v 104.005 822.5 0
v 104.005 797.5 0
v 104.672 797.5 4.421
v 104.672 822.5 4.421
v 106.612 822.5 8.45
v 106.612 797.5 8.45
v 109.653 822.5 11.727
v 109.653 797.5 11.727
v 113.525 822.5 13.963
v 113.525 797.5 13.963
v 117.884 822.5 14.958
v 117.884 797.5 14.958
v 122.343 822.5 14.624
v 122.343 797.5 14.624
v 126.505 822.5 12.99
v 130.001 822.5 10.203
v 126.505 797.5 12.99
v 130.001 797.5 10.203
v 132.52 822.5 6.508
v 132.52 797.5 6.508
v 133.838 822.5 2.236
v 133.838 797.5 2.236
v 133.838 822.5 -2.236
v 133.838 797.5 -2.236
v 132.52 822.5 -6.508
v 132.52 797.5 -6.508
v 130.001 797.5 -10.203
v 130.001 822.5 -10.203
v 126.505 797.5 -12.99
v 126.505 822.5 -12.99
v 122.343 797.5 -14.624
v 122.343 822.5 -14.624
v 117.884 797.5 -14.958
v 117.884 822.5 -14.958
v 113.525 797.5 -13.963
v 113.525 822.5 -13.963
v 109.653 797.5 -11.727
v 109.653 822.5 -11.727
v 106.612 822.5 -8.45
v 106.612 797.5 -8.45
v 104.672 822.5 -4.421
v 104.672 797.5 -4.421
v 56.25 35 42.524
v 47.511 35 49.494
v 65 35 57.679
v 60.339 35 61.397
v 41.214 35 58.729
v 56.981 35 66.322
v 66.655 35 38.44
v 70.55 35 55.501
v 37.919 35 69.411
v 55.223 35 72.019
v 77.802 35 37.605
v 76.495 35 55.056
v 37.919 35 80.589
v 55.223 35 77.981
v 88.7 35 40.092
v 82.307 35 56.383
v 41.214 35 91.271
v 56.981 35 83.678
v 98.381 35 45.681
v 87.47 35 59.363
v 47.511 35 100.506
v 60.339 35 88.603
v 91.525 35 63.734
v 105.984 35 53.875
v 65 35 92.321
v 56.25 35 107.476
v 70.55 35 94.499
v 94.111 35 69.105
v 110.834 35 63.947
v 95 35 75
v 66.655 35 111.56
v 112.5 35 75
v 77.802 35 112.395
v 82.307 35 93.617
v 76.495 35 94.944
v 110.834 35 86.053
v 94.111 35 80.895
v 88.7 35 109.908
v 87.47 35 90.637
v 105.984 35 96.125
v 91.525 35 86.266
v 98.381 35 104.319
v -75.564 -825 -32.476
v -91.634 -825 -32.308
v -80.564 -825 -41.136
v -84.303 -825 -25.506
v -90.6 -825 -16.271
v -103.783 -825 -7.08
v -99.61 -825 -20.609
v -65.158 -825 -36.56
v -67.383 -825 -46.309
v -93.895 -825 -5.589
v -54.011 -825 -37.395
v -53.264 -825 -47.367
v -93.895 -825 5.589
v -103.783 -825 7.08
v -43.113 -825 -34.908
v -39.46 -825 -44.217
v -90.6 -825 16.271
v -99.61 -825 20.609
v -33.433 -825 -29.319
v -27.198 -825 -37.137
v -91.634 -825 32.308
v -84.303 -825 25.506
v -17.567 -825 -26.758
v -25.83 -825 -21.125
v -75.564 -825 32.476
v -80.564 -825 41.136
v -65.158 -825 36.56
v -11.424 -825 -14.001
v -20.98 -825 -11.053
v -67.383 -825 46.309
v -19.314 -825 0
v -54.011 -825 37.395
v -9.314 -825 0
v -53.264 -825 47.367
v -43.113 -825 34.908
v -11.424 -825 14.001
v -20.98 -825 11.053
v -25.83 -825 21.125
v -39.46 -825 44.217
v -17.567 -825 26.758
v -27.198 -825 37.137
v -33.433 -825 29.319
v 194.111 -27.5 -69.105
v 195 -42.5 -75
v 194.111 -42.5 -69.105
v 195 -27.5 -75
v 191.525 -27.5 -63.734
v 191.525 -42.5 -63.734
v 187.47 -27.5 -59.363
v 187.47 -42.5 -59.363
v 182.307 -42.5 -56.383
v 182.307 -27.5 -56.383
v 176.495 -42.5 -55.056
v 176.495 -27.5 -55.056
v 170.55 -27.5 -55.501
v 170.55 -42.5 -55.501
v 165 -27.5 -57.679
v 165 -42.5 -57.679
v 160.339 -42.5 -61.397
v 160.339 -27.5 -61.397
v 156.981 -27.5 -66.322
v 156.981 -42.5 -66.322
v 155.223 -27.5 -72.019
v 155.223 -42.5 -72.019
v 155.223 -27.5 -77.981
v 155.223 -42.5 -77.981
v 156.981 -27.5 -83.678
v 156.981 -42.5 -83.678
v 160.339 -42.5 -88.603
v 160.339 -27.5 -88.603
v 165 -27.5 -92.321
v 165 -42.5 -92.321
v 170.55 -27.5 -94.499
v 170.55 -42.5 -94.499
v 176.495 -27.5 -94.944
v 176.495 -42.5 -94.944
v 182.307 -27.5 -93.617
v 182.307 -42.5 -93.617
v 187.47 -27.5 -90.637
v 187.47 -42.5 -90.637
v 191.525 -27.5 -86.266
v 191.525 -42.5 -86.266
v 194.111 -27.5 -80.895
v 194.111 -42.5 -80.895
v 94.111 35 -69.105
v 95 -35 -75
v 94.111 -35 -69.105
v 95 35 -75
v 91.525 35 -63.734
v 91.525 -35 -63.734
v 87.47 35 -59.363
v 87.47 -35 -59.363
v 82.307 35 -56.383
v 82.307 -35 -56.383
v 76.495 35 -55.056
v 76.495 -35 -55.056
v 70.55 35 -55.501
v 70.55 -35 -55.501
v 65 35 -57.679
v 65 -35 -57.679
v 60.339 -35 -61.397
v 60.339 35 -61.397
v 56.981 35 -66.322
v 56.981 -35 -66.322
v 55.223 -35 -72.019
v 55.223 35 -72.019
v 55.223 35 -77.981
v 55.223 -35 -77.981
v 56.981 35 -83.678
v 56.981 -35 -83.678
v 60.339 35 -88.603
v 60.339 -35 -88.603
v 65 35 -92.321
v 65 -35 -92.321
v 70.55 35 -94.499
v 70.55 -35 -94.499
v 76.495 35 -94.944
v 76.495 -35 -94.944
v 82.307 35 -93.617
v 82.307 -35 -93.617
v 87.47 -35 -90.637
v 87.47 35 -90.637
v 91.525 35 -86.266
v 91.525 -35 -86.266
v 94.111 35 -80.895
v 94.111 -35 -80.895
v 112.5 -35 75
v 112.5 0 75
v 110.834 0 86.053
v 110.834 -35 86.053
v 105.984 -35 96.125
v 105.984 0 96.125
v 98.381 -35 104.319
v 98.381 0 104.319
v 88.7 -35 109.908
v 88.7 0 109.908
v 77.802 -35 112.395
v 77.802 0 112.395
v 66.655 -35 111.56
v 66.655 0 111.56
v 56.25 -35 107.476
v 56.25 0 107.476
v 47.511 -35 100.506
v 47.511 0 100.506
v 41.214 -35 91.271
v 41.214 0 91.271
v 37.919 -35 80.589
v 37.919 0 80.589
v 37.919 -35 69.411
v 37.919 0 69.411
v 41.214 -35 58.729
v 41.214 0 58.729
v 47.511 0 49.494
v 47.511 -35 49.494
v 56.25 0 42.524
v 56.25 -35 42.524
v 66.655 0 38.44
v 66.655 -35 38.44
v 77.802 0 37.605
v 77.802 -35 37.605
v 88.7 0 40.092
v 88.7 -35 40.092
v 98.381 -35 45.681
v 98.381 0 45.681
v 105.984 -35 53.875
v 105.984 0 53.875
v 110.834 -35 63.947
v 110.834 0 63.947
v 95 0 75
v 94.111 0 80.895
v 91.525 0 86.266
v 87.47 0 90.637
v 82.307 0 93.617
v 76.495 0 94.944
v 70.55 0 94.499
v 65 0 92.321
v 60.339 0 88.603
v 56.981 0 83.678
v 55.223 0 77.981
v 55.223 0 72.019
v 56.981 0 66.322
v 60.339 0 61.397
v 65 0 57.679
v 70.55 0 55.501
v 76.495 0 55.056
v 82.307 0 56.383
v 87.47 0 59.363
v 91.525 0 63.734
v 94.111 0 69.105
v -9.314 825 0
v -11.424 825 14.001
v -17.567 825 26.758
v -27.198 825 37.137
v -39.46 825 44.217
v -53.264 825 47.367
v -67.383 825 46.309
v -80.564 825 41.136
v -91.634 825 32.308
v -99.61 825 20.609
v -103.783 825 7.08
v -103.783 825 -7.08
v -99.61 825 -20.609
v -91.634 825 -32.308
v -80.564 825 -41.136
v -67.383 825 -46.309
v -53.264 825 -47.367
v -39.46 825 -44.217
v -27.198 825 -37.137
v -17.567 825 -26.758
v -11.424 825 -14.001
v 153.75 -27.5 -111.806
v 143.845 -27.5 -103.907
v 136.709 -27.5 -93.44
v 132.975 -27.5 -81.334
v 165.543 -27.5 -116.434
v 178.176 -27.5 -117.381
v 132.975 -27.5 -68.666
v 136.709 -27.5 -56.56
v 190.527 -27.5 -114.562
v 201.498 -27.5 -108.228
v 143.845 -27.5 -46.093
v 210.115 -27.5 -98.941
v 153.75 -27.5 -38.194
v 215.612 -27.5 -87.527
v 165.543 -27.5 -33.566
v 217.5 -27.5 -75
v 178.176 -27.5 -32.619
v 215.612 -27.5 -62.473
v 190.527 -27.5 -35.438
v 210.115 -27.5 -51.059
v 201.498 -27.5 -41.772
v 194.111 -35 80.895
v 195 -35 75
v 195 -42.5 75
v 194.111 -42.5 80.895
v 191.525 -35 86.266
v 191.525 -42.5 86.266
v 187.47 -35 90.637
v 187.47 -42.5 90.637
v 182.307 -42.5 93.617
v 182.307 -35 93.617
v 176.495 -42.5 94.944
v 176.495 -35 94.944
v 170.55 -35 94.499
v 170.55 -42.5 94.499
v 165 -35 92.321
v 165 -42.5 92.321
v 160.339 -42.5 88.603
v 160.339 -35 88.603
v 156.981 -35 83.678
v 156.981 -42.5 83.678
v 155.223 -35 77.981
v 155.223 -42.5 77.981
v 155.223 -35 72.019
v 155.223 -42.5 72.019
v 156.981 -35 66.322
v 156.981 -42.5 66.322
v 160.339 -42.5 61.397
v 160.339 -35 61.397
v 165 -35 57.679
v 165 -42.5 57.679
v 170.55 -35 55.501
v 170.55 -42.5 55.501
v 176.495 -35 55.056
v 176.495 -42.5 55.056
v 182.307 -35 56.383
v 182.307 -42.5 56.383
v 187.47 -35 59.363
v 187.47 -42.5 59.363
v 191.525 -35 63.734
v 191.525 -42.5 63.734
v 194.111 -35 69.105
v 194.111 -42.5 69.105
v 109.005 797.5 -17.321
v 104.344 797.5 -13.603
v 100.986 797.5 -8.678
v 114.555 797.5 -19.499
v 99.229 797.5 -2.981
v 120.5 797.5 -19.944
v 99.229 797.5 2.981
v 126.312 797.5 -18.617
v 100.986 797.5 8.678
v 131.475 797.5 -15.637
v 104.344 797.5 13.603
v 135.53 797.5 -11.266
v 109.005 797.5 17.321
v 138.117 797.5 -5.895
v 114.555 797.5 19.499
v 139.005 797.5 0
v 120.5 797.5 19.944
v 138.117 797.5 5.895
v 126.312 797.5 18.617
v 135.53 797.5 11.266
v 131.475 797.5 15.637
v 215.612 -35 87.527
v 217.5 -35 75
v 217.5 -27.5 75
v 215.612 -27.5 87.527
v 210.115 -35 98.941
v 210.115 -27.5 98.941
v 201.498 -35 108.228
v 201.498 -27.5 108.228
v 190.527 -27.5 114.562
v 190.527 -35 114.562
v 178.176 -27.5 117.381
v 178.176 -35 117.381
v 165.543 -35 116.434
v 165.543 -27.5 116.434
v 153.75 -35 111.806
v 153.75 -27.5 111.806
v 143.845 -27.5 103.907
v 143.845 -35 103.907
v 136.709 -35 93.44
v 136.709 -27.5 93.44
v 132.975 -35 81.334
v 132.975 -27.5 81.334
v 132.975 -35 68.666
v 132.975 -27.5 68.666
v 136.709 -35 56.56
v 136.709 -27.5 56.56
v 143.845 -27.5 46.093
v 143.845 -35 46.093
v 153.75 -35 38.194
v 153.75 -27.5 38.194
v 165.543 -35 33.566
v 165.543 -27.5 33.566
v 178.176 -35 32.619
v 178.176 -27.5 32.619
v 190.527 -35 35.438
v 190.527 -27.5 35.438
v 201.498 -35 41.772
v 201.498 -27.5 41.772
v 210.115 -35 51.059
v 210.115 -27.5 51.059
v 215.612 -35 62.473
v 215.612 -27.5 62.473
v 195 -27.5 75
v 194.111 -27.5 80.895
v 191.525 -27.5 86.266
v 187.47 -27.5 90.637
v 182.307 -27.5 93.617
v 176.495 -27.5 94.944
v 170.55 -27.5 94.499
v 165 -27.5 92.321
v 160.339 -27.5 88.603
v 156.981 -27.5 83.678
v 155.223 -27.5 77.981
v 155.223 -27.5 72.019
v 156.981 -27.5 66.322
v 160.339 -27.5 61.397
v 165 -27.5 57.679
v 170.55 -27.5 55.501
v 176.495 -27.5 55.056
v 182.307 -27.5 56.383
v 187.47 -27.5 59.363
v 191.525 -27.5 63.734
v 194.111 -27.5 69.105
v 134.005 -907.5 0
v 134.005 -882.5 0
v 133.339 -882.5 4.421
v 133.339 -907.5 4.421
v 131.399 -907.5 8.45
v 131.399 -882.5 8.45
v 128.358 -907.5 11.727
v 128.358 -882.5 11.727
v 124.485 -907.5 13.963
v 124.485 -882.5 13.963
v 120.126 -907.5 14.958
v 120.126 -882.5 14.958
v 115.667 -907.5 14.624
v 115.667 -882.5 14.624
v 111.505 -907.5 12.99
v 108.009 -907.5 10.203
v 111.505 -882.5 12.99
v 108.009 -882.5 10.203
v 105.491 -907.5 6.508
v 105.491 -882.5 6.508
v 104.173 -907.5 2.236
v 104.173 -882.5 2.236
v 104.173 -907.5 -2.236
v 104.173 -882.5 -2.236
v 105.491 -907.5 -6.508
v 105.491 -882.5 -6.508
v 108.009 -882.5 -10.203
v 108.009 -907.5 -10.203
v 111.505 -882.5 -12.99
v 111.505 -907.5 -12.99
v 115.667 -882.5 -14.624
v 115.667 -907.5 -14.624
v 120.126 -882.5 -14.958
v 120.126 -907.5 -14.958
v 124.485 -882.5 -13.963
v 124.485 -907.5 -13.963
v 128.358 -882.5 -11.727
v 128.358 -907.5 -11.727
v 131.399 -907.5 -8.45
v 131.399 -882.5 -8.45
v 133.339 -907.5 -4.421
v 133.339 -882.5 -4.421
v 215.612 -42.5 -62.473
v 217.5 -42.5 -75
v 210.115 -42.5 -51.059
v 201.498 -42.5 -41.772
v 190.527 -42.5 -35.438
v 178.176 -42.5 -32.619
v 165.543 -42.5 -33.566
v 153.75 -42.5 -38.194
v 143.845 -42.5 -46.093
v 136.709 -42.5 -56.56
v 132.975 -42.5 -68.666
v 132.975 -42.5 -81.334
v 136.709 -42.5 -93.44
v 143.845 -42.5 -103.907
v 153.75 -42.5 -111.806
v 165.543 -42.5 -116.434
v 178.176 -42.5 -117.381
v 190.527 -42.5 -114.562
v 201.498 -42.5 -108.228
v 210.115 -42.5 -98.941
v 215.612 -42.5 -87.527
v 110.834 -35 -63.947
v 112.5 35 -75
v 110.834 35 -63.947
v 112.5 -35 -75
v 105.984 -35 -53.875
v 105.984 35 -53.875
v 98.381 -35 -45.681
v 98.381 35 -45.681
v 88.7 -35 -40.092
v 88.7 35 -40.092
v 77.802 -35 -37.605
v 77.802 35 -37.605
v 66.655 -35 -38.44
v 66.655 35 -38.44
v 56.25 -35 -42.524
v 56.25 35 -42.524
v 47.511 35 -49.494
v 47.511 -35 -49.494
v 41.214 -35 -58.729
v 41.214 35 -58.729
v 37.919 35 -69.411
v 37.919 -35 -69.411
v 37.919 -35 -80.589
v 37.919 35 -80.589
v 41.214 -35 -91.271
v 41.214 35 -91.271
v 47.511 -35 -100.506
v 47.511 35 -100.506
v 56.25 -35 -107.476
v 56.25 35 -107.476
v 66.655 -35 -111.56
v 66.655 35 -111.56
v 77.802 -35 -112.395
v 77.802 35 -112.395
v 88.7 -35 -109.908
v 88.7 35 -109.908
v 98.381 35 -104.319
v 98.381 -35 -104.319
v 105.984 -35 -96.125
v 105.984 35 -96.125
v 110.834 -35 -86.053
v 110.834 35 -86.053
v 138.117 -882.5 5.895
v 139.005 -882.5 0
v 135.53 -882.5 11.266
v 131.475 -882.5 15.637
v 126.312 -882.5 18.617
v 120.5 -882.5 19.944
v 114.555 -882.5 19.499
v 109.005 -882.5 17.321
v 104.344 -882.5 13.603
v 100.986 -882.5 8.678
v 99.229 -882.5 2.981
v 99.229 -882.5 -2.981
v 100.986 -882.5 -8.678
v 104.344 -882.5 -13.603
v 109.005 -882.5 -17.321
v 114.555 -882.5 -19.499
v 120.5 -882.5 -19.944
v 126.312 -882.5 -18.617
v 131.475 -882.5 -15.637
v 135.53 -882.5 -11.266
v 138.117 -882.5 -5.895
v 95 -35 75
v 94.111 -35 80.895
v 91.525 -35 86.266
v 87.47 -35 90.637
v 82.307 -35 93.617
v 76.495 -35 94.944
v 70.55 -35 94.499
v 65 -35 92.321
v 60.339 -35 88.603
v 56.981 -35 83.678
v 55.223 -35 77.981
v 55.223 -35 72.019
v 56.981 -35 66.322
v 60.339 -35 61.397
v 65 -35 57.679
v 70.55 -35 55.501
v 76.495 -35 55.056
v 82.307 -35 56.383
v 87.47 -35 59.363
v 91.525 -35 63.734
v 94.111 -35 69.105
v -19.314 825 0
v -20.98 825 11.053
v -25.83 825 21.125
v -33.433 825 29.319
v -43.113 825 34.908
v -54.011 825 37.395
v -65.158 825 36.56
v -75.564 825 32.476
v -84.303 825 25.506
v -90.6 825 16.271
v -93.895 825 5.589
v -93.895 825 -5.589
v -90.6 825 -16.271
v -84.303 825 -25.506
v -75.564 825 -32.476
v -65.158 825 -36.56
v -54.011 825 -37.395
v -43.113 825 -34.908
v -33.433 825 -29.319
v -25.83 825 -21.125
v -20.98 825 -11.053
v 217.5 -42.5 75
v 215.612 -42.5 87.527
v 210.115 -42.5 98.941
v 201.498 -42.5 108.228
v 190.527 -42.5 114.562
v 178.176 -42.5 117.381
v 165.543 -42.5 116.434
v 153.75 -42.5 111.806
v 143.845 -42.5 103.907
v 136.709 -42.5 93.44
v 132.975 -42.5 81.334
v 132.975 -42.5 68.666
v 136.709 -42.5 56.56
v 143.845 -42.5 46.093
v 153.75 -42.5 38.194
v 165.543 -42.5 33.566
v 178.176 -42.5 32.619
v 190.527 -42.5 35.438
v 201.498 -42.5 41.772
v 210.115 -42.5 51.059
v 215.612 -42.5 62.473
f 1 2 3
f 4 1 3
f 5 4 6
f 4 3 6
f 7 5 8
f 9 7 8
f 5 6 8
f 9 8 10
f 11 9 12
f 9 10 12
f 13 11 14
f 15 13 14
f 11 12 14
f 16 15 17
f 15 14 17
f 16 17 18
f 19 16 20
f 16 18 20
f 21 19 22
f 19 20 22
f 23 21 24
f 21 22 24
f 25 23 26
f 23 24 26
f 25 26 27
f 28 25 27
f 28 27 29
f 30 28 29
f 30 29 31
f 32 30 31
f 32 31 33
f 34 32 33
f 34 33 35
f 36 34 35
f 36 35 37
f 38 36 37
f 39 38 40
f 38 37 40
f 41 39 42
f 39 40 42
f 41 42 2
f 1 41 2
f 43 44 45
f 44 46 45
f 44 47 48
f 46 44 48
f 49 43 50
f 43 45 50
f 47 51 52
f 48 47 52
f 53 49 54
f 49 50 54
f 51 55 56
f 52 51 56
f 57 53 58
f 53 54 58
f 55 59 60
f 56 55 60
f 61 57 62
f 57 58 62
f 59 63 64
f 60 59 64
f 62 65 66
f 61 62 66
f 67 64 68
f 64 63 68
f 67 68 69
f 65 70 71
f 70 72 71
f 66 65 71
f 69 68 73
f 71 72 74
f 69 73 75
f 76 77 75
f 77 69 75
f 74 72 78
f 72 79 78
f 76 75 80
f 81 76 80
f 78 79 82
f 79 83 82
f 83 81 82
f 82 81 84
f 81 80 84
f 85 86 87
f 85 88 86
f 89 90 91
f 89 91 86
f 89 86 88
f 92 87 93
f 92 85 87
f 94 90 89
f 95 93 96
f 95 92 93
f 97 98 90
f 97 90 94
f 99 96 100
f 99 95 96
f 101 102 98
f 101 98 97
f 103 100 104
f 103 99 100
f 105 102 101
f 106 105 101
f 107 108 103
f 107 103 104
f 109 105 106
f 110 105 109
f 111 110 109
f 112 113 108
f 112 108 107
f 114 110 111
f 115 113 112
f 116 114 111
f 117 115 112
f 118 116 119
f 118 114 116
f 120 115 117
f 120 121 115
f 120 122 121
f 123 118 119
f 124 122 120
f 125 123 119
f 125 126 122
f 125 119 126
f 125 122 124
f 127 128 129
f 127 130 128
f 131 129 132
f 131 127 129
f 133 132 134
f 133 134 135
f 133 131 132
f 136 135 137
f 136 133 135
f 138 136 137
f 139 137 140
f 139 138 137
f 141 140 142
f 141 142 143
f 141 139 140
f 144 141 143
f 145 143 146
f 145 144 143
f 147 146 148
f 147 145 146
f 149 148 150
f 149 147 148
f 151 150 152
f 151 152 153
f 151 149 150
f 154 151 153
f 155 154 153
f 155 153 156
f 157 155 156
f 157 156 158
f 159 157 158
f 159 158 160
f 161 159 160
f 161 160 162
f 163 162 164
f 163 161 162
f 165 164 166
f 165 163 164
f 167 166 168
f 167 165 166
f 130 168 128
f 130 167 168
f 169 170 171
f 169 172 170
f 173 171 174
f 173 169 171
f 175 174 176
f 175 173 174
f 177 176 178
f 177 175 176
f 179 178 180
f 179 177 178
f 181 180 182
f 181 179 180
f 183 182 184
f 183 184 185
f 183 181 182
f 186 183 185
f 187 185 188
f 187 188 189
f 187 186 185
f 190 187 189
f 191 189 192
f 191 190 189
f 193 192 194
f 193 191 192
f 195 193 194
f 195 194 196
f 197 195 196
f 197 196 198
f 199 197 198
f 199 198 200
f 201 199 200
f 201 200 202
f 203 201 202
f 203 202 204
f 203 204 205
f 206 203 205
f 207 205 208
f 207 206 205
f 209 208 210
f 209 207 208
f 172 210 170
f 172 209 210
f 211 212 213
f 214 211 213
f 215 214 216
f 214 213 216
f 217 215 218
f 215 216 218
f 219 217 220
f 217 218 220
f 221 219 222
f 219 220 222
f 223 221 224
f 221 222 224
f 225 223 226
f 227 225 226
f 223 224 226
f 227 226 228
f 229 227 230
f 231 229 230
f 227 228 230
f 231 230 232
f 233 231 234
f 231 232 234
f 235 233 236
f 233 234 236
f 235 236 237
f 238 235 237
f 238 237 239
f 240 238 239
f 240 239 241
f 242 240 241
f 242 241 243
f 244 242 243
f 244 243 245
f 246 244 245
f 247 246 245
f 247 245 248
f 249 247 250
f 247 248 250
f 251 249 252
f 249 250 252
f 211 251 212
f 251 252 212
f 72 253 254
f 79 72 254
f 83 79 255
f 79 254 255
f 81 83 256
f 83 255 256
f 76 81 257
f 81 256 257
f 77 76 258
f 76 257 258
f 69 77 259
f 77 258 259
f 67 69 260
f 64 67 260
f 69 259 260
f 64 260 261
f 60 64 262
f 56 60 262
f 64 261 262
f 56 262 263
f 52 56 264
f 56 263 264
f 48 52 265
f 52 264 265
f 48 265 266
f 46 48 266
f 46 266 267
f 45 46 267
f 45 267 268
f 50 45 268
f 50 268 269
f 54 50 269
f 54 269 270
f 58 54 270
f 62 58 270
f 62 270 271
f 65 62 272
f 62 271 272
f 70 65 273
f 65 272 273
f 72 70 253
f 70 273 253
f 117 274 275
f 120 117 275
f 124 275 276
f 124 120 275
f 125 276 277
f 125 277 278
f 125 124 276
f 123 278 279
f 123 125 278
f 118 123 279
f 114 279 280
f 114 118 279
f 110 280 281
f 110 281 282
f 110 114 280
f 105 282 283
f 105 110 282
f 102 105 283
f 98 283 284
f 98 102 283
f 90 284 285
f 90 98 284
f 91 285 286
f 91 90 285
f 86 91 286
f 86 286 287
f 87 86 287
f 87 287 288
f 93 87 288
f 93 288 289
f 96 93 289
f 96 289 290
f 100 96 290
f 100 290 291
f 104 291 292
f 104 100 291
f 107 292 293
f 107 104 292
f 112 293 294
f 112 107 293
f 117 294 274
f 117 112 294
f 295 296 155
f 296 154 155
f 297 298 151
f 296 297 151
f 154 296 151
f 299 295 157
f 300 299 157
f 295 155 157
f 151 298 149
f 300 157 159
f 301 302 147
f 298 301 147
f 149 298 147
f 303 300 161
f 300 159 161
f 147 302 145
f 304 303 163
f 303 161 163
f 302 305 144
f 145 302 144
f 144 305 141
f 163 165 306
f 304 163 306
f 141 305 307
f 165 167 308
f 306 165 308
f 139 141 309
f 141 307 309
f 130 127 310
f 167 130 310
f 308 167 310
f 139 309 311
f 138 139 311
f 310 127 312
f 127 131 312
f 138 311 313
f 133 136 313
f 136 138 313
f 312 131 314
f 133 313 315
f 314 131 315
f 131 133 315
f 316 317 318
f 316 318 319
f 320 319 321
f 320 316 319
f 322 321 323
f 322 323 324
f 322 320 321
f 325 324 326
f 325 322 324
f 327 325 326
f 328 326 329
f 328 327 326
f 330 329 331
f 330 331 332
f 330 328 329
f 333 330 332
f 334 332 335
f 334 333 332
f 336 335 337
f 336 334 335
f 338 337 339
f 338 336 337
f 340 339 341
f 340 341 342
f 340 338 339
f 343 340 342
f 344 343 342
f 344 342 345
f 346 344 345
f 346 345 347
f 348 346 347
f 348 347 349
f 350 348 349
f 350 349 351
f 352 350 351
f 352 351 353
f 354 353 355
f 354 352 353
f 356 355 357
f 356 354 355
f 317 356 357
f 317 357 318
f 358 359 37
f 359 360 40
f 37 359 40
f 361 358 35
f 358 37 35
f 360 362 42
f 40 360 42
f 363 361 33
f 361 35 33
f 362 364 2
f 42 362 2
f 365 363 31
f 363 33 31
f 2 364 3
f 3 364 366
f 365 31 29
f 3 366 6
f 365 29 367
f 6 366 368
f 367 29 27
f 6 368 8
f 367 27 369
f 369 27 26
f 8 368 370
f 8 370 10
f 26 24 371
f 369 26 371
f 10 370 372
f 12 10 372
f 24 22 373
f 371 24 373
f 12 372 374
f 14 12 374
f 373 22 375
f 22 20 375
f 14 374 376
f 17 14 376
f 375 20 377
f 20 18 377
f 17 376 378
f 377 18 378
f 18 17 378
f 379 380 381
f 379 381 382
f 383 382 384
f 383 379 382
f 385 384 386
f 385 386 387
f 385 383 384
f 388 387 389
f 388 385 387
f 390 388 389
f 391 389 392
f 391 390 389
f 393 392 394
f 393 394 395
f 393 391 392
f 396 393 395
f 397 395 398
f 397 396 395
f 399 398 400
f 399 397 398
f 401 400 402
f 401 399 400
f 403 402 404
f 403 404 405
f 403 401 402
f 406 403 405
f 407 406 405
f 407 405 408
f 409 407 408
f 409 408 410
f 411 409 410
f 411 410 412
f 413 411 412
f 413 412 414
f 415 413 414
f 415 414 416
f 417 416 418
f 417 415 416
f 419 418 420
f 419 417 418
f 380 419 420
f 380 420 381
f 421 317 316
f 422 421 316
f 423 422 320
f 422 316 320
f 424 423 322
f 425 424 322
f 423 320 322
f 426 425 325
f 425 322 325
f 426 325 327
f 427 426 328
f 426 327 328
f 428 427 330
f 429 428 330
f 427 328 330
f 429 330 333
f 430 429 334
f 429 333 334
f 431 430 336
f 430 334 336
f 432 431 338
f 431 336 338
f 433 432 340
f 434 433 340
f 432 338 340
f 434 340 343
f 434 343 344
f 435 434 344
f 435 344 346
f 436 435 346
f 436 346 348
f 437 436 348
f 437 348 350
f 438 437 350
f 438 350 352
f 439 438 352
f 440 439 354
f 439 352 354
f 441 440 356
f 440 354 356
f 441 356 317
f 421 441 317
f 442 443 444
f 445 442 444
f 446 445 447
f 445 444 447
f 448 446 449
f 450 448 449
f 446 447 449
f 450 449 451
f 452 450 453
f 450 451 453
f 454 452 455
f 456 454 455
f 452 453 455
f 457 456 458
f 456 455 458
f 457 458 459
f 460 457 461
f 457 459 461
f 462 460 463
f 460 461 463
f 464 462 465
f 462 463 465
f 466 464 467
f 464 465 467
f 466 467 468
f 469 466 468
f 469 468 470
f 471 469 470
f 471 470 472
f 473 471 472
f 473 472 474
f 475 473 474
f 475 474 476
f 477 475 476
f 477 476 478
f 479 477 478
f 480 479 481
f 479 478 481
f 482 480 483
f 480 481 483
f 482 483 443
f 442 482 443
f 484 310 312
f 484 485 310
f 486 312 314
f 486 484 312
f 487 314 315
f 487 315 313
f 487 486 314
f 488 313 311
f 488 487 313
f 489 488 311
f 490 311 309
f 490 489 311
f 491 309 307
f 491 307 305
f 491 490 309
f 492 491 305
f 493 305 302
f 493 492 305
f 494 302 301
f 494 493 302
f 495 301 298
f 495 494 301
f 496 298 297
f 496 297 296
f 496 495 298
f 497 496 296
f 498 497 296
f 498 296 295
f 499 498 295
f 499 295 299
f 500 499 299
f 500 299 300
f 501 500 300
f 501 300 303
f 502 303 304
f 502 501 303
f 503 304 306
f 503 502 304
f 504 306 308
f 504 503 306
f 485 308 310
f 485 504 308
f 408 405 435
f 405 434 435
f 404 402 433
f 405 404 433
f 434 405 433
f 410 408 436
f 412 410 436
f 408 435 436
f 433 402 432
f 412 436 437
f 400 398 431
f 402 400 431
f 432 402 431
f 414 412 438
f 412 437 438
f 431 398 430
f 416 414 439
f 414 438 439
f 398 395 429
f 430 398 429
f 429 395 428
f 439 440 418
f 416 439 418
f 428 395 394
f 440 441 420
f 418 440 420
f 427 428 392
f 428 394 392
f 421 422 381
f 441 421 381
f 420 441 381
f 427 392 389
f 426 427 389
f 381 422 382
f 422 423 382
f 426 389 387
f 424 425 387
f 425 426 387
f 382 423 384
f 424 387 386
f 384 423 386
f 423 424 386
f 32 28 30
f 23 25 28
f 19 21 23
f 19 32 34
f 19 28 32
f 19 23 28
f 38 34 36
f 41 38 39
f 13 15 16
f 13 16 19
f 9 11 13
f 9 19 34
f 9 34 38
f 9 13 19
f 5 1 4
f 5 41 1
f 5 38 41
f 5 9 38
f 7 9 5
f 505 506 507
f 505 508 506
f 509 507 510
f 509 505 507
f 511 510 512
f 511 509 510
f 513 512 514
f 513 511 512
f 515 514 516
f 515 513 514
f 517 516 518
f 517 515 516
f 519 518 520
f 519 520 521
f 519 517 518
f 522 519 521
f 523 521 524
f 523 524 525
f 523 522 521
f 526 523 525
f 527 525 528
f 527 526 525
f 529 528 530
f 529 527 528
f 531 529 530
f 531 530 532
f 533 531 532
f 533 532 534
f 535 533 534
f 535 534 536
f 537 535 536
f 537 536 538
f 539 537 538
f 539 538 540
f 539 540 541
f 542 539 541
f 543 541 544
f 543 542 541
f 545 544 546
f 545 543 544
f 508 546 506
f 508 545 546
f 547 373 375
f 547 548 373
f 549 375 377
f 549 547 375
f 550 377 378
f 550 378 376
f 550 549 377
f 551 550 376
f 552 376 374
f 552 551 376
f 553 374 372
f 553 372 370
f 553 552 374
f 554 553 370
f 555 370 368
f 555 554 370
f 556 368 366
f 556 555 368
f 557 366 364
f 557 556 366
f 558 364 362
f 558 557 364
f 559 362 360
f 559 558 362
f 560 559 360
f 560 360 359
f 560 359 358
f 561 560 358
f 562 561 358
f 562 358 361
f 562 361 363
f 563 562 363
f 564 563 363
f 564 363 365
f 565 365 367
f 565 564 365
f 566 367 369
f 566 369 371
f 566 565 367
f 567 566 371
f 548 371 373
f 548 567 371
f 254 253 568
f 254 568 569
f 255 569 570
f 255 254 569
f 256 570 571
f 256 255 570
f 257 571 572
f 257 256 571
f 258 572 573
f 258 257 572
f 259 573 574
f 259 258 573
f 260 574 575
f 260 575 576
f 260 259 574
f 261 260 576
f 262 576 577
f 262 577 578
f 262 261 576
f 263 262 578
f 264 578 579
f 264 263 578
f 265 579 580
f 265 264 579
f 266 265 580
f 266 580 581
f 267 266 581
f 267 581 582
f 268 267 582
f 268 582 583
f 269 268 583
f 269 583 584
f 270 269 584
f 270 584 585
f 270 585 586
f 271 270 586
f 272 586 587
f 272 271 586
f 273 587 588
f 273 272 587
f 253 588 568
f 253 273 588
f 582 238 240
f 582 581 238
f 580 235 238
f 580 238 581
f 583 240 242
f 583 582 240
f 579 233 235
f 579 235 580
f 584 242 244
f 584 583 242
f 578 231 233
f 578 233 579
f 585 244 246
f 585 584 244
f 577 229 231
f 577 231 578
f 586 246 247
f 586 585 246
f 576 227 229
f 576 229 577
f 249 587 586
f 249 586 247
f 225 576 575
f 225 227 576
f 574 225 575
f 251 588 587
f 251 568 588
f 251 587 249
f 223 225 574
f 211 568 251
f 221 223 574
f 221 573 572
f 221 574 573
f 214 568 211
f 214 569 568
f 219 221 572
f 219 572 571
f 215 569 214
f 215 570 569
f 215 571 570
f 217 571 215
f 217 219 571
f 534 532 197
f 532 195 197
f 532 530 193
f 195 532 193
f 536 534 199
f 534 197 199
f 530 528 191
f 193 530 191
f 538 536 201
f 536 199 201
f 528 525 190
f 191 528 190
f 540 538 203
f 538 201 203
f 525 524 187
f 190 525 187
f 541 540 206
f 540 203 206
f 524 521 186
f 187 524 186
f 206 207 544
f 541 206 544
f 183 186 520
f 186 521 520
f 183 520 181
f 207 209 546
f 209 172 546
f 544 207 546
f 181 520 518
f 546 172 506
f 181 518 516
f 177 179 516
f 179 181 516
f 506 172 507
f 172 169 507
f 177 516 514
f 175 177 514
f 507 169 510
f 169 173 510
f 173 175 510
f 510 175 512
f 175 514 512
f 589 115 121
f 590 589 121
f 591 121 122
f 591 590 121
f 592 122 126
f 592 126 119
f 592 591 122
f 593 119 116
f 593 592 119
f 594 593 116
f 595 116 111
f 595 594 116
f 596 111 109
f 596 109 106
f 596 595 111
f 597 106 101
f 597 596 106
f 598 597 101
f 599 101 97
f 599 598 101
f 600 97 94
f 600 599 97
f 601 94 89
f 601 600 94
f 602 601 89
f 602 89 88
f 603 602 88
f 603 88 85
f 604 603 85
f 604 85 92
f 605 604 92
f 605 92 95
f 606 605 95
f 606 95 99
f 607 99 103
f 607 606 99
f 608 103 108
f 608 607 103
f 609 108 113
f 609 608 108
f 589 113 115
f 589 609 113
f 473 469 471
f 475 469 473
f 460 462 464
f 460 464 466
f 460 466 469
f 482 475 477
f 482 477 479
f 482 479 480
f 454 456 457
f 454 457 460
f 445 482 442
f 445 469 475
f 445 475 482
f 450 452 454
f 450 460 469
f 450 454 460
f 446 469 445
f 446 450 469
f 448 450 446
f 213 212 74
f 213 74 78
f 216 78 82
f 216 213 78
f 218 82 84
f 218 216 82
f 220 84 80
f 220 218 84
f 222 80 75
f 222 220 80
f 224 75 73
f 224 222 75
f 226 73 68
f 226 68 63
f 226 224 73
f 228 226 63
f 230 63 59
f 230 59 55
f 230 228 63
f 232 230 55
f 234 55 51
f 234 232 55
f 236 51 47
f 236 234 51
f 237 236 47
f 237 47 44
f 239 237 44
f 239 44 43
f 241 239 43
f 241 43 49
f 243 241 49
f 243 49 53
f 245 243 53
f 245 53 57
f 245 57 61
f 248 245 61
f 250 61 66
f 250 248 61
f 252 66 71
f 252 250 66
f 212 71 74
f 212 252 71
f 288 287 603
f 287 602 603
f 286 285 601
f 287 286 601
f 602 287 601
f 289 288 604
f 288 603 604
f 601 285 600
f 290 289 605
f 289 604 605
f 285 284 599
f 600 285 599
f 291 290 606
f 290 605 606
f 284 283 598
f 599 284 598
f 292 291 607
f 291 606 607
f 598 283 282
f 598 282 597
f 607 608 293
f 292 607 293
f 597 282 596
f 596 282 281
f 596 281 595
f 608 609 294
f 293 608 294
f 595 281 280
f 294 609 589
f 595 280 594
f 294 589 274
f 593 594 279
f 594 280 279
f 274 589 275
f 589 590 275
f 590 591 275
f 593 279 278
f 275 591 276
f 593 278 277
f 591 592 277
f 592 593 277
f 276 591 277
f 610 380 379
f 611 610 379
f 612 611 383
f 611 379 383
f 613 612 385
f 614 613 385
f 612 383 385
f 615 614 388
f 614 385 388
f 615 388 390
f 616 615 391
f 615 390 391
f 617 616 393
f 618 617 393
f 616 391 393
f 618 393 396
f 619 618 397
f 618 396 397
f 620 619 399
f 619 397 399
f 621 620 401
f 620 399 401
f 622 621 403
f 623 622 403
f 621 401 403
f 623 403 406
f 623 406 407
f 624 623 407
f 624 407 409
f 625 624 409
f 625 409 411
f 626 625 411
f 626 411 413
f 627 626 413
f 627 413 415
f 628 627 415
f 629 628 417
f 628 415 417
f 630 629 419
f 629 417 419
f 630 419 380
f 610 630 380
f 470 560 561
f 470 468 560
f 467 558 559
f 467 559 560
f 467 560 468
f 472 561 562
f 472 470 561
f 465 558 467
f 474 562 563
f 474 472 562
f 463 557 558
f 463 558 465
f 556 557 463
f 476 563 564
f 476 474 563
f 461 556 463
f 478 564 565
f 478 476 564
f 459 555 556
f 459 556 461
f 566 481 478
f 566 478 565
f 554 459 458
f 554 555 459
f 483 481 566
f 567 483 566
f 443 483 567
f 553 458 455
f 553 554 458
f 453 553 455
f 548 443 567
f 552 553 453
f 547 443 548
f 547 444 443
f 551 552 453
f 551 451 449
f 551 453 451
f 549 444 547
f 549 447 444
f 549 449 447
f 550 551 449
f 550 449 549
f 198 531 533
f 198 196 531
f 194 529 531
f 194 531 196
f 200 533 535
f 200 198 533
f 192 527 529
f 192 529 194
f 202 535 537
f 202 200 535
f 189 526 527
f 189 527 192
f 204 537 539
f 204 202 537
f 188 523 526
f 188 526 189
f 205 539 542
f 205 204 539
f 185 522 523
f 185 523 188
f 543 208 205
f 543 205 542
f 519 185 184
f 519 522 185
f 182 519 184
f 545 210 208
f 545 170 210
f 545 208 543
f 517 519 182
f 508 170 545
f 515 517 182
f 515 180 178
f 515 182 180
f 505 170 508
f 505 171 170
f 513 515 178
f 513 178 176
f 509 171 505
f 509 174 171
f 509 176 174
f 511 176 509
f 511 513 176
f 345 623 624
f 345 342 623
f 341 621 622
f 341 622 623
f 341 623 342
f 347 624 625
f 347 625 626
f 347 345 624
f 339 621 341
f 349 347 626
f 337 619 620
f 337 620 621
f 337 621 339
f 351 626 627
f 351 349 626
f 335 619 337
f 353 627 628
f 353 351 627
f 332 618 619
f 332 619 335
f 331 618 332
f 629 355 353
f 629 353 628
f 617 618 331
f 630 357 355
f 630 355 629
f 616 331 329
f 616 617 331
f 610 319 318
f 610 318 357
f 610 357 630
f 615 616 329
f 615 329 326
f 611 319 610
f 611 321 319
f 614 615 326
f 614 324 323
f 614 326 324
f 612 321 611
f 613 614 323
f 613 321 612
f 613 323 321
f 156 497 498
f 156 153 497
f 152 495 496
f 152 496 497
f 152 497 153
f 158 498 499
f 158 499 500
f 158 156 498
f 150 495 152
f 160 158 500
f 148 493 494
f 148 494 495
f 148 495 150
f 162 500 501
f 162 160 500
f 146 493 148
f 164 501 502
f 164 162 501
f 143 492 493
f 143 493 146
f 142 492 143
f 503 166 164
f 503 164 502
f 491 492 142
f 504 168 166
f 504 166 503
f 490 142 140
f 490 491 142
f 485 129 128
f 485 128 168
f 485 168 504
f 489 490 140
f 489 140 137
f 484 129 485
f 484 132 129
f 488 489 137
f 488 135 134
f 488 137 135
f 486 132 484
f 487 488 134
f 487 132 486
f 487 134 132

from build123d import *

# Parameters (mm, degrees)
F0_R      = 47.5
F0_R_2    = 37.5
F1_DEPTH  = 825
F2_R      = 37.5
F2_R_2    = 20
F3_DEPTH  = 35
F4_R      = 42.5
F4_R_2    = 20
F5_DEPTH  = 7.5
F6_R      = 20
F7_DEPTH  = 840
F8_R      = 15
F9_DEPTH  = 25
F10_R     = 15
F11_DEPTH = 25


with BuildPart() as f1:
    # F0 (on Front) → F1 (new body, symmetric)
    with BuildSketch(Plane.XZ):
        with Locations((-56.813729, 0)):
            Circle(F0_R)
        with Locations((-56.813729, 0)):
            Circle(F0_R_2, mode=Mode.SUBTRACT)
    extrude(amount=F1_DEPTH, both=True)


with BuildPart() as f3:
    # F2 (on Front) → F3 (new body, symmetric)
    with BuildSketch(Plane.XZ):
        with Locations((75, 75)):
            Circle(F2_R)
        with Locations((75, 75)):
            Circle(F2_R_2, mode=Mode.SUBTRACT)
        with Locations((75, -75)):
            Circle(F2_R)
        with Locations((75, -75)):
            Circle(F2_R_2, mode=Mode.SUBTRACT)
    extrude(amount=F3_DEPTH, both=True)


with BuildPart() as f5:
    # F4 (on face) → F5 (new body, symmetric)
    with BuildSketch(Plane.XZ.offset(35)):
        with Locations((175, 75)):
            Circle(F4_R)
        with Locations((175, 75)):
            Circle(F4_R_2, mode=Mode.SUBTRACT)
        with Locations((175, -75)):
            Circle(F4_R)
        with Locations((175, -75)):
            Circle(F4_R_2, mode=Mode.SUBTRACT)
    extrude(amount=F5_DEPTH, both=True)


with BuildPart() as f7:
    # F6 (on face) → F7 (new body, symmetric)
    with BuildSketch(Plane.XZ.offset(42.5)):
        with Locations((119.005217, 0)):
            Circle(F6_R)
    extrude(amount=F7_DEPTH, both=True)

    # F8 (on face) → F9 (join)
    with BuildSketch(Plane.XZ.offset(882.5)):
        with Locations((119.005217, 0)):
            Circle(F8_R)
    extrude(amount=F9_DEPTH)

    # F10 (on face) → F11 (join)
    with BuildSketch(Plane(origin=(0, 797.5, 0), x_dir=(-1, 0, 0), z_dir=(0, 1, 0))):
        with Locations((-119.005217, 0)):
            Circle(F10_R)
    extrude(amount=F11_DEPTH)


solid = Compound([f1.part, f3.part, f5.part, f7.part])
